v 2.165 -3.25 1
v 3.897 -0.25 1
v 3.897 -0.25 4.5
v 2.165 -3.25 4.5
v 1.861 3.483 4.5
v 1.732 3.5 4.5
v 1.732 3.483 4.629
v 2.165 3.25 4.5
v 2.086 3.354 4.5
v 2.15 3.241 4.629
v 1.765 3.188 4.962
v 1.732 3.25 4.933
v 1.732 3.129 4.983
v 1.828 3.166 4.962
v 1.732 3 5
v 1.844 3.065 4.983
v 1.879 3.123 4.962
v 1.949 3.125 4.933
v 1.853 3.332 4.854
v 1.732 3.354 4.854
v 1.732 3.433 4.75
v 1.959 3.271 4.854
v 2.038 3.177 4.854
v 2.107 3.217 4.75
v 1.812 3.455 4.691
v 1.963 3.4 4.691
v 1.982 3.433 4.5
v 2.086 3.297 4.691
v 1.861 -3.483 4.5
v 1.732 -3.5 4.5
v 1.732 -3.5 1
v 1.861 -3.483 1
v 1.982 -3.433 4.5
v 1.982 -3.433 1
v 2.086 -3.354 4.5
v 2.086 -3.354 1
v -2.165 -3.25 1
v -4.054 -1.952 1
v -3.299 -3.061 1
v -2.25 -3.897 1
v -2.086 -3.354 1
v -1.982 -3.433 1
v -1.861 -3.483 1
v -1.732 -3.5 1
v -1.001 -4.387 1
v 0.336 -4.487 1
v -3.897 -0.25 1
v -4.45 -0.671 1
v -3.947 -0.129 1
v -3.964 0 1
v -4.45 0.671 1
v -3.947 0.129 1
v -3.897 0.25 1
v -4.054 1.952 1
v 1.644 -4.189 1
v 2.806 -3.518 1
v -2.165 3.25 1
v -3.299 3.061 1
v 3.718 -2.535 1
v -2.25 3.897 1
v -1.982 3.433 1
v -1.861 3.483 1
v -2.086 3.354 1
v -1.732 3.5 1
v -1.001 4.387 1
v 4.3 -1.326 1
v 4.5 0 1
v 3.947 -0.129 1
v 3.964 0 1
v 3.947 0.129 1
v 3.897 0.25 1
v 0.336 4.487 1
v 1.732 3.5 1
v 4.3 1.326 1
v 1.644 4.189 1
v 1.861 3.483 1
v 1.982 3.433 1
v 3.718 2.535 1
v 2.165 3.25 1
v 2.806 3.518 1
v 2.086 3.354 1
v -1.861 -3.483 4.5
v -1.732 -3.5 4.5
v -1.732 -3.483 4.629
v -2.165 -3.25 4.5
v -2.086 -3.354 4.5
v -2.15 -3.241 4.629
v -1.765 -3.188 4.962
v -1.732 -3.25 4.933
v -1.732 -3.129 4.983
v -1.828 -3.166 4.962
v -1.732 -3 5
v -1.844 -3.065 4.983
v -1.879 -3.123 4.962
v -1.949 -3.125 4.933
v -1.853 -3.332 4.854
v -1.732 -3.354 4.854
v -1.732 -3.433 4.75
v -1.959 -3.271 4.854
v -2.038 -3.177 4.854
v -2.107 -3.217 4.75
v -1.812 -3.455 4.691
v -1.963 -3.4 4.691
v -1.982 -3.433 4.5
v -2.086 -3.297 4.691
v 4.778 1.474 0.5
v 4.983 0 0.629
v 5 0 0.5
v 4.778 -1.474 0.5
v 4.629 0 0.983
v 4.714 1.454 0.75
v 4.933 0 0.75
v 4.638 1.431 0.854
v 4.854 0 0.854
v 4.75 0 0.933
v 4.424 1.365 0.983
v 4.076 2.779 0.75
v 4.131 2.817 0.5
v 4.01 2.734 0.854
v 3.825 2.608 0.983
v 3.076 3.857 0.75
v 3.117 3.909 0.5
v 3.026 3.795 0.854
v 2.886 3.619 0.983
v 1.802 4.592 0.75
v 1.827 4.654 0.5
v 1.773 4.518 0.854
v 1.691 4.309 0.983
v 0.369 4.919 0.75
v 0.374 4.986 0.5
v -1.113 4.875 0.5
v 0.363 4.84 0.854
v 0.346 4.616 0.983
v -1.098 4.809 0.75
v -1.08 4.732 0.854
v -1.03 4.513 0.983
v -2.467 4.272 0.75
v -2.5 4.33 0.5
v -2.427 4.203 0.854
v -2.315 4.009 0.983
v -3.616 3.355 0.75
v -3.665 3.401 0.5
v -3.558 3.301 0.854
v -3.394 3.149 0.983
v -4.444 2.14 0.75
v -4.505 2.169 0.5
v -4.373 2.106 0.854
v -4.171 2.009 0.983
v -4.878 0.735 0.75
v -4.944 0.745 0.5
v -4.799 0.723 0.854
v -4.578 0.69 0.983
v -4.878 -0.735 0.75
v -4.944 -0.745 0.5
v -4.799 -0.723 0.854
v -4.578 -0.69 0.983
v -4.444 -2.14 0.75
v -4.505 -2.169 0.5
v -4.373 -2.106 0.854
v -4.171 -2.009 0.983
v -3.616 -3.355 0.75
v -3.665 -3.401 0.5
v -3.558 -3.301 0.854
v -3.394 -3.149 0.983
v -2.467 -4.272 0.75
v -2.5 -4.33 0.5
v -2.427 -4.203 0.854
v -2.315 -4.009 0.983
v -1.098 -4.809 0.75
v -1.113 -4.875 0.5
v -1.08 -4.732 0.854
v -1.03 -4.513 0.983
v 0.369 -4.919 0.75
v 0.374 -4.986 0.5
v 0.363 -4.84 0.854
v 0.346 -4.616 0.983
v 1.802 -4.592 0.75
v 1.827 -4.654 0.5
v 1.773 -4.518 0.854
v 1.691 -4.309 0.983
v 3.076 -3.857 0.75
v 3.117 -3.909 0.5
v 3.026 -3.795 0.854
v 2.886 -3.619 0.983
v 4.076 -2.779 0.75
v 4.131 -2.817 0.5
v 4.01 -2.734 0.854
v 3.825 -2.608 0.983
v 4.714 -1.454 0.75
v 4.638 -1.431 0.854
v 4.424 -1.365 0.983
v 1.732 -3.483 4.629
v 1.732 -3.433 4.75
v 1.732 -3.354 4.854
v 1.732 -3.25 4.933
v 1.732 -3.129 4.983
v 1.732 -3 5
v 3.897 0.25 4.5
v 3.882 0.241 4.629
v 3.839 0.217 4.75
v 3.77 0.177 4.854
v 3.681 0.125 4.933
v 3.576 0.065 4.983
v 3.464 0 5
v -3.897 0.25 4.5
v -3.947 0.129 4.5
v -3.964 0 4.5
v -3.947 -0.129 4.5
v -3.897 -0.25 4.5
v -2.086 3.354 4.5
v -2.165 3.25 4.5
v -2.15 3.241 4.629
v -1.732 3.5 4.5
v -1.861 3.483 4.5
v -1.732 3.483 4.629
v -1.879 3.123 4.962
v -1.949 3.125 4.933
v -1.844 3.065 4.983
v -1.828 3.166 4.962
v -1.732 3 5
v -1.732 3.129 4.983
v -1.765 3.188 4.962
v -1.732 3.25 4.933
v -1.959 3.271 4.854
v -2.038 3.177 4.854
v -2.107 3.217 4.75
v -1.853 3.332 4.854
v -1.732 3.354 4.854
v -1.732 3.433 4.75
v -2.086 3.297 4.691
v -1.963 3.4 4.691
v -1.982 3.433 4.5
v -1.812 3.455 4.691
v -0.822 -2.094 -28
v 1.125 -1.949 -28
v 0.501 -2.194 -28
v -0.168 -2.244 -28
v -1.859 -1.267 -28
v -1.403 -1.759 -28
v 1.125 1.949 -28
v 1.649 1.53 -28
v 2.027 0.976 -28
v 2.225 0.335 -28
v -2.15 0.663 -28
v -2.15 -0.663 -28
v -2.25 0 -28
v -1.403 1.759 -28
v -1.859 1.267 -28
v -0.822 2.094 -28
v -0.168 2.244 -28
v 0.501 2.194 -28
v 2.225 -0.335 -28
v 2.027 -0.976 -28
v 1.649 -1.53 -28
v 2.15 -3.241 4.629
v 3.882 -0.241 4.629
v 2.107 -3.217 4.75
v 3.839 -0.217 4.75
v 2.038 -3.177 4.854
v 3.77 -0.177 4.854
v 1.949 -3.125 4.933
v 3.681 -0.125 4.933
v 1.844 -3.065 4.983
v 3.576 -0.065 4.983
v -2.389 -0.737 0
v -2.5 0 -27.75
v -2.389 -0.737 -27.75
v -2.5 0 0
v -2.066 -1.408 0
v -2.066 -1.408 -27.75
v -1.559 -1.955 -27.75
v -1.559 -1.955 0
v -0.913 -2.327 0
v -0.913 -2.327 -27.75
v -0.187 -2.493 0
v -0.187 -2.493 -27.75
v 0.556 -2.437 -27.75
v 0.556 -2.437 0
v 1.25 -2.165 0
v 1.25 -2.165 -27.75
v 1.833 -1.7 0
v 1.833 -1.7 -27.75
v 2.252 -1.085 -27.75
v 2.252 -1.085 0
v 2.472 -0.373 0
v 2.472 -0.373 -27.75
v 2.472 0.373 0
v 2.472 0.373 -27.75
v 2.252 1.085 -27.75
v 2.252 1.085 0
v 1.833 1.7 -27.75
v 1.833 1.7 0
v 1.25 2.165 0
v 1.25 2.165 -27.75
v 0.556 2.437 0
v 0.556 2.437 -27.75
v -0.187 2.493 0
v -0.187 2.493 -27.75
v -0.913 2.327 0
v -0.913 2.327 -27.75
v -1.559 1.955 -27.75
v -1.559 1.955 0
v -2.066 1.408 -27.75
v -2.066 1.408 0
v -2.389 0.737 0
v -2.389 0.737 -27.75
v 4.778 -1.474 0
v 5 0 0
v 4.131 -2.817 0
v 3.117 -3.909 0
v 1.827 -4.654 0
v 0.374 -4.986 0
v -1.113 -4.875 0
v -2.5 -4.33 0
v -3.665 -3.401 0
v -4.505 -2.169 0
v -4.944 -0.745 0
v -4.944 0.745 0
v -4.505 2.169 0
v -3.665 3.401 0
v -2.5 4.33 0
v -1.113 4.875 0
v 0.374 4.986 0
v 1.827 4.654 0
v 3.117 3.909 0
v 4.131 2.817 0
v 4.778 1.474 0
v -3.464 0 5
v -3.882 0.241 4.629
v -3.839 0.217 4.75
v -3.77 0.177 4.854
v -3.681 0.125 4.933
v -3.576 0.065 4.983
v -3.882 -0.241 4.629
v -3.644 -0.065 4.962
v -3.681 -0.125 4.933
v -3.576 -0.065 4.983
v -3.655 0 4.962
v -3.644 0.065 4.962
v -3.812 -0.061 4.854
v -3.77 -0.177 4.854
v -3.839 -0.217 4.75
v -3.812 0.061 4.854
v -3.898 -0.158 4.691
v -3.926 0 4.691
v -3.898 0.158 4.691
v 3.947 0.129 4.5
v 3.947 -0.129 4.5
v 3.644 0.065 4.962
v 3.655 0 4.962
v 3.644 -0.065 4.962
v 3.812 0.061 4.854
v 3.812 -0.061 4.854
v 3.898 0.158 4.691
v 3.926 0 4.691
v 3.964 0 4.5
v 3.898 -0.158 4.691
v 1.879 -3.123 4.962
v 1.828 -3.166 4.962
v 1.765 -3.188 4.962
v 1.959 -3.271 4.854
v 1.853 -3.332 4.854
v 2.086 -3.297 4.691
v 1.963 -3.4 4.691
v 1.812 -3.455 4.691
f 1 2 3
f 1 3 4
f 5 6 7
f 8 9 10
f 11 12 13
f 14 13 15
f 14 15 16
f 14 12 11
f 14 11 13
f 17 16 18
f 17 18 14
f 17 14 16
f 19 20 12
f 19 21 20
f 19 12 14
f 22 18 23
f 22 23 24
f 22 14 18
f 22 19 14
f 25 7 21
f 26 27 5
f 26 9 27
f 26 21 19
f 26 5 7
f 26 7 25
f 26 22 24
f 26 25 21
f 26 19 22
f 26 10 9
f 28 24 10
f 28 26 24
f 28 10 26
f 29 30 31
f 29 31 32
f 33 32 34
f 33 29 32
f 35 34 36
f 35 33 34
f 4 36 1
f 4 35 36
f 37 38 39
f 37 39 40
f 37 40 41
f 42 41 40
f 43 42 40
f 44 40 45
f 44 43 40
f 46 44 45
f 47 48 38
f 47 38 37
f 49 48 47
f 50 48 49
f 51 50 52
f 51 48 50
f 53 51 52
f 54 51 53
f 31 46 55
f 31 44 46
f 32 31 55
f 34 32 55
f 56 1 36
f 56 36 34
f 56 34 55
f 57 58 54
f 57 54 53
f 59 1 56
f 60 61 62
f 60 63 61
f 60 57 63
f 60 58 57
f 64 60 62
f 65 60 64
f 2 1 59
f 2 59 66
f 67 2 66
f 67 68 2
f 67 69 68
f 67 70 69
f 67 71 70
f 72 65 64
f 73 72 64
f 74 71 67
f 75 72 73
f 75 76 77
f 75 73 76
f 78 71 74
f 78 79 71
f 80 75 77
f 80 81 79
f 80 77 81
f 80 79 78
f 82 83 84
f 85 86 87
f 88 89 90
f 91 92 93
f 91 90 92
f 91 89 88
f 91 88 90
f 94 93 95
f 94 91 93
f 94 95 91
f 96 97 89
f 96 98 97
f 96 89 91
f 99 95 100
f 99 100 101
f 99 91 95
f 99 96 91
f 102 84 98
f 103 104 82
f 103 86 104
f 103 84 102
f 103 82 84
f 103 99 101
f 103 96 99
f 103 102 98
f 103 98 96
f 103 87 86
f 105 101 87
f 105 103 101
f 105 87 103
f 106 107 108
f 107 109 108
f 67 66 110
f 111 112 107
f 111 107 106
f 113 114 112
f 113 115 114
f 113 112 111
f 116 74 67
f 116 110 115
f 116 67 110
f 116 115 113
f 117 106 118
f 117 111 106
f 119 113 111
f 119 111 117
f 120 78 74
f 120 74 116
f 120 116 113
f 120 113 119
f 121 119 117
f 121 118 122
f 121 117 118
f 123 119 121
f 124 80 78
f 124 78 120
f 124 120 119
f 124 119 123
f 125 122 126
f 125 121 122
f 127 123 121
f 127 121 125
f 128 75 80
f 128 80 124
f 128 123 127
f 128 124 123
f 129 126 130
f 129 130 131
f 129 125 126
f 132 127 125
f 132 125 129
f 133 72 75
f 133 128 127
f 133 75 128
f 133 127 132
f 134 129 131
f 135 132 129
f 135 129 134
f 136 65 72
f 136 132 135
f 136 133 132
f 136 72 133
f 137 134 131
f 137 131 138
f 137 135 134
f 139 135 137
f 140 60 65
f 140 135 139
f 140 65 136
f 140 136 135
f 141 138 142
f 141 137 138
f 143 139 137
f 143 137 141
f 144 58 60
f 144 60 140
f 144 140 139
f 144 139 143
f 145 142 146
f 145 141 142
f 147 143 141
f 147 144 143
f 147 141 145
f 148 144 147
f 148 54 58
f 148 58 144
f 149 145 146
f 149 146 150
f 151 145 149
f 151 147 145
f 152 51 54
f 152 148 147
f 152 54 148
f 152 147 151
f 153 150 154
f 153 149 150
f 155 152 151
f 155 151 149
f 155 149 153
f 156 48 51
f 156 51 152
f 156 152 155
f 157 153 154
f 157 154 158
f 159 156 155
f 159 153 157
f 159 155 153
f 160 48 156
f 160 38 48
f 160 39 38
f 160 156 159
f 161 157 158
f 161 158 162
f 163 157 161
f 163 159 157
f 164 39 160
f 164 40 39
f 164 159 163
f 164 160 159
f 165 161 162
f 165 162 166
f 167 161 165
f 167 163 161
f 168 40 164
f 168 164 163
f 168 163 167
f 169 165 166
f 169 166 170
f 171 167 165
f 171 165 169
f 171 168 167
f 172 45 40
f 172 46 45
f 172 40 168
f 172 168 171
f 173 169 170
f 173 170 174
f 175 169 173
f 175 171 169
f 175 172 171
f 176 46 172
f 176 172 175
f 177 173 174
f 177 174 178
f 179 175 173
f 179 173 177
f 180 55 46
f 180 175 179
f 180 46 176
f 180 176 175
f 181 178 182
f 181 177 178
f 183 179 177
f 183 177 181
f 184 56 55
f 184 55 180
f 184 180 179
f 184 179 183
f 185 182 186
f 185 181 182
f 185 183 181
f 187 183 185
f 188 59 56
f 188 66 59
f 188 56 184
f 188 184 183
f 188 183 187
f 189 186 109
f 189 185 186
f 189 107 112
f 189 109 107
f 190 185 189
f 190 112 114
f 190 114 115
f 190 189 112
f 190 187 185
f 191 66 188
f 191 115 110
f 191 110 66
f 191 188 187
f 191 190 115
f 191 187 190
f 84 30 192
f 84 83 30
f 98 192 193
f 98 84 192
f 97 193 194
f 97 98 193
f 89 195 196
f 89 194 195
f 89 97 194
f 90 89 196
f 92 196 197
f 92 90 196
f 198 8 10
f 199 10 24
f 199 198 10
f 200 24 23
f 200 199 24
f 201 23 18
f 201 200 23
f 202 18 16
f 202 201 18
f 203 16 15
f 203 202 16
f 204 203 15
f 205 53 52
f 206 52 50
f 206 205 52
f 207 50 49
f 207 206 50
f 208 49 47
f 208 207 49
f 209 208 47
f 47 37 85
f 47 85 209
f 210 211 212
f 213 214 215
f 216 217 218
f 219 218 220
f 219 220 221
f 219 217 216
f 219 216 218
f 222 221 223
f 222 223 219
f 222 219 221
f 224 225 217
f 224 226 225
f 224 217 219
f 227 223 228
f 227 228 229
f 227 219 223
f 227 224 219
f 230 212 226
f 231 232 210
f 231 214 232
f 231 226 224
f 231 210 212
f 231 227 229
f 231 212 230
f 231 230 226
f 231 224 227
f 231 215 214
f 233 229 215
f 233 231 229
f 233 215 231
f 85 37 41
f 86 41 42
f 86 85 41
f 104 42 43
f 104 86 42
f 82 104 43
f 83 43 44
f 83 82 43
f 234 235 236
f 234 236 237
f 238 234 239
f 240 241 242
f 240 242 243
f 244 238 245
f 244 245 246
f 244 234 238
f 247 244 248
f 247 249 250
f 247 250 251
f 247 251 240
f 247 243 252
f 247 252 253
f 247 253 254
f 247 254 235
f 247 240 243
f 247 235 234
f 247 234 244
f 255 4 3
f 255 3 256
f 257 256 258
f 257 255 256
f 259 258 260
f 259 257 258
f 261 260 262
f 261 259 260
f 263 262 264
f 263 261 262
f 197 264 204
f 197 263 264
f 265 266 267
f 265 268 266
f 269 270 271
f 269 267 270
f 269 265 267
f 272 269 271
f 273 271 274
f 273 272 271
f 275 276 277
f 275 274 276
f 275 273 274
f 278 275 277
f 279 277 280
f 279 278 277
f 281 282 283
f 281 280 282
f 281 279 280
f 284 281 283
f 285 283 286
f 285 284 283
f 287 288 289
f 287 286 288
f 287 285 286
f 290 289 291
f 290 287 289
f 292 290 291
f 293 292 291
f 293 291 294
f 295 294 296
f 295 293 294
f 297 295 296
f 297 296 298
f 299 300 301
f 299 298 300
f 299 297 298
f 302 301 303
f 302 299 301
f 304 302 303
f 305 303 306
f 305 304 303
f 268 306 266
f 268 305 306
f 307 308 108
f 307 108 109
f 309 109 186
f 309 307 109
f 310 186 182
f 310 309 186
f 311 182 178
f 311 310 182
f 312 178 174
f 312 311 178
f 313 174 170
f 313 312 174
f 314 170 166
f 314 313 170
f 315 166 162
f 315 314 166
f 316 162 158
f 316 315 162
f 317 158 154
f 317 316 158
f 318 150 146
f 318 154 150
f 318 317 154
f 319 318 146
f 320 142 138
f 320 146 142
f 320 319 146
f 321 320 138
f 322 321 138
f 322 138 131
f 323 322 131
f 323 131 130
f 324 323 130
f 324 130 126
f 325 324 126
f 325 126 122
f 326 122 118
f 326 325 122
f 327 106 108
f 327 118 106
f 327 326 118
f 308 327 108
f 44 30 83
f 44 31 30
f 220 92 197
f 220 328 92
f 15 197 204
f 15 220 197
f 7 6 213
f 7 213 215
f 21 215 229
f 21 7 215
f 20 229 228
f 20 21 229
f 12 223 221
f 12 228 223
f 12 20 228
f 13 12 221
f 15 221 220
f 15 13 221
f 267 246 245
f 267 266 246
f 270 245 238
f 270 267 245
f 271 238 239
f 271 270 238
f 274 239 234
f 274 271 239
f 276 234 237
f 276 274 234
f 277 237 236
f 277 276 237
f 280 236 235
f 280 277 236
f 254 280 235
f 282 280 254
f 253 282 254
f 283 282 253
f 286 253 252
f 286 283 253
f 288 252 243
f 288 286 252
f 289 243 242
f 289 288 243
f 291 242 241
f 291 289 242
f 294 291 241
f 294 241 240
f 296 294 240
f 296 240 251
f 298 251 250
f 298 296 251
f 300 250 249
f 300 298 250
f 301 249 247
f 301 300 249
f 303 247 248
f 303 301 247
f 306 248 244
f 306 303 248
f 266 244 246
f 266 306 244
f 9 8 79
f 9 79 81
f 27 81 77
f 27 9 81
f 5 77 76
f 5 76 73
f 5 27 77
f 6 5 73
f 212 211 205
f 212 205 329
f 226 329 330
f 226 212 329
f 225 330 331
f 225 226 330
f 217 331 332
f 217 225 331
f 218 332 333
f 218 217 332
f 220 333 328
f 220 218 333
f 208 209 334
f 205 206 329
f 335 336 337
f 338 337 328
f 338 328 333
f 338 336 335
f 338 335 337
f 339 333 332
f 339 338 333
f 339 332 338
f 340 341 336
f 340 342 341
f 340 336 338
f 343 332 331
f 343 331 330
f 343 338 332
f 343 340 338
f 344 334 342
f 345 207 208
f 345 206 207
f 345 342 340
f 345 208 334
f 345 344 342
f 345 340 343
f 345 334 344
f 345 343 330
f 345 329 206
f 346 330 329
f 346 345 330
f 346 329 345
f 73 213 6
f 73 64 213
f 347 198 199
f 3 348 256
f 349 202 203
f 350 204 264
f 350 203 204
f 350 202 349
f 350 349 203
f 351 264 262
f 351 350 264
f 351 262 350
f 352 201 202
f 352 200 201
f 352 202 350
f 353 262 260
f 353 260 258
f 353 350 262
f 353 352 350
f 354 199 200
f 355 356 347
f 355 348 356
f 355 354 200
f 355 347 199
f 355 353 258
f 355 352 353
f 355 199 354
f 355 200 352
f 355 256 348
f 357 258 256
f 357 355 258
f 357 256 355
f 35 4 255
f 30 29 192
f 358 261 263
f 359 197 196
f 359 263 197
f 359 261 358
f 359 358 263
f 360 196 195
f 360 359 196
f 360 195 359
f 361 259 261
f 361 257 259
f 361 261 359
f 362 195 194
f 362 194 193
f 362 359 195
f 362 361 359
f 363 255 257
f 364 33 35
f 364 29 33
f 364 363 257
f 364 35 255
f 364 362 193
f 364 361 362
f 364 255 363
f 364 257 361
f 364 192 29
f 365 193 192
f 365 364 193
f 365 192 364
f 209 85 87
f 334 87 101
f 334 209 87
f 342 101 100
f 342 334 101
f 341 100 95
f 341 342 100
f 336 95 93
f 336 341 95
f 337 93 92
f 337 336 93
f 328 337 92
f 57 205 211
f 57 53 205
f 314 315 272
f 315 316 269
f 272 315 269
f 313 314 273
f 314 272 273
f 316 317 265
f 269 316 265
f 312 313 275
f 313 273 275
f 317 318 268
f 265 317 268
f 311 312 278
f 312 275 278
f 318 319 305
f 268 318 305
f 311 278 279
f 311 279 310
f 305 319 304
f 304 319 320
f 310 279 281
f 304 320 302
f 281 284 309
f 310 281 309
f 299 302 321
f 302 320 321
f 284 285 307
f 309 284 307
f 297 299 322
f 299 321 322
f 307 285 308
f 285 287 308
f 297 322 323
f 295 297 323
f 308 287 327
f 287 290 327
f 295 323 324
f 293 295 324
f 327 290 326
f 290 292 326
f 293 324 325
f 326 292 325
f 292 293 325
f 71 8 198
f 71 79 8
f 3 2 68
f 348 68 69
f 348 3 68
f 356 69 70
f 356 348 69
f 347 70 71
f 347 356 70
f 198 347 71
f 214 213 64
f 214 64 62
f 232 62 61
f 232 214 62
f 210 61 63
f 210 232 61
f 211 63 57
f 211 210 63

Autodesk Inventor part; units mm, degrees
ref_plane "YZ Plane" through (0, 0, 0) normal (1, 0, 0) x (0, 1, 0)
ref_plane "XZ Plane" through (0, 0, 0) normal (0, 1, 0) x (-1, 0, 0)
ref_plane "XY Plane" through (0, 0, 0) normal (0, 0, 1) x (1, 0, 0)
sketch "草图1" plane through (0, 0, 0) normal (0, 0, 1) x (1, 0, 0)
  circle A0 centre (0, 0) radius 5
  dimension "d0" = 10
extrude "拉伸1" add sketch "草图1" along normal blind 1
sketch "草图2" plane through (0, 0, 1) normal (0, 0, 1) x (1, 0, 0)
  line L0 (2.0207, -3.5) -> (-2.0207, -3.5)
  line L1 (-2.0207, -3.5) -> (-4.0415, 0)
  line L2 (-4.0415, 0) -> (-2.0207, 3.5)
  line L3 (-2.0207, 3.5) -> (2.0207, 3.5)
  line L4 (2.0207, 3.5) -> (4.0415, 0)
  line L5 (4.0415, 0) -> (2.0207, -3.5)
  line L6 (0, 0) -> (0, 1.4053)
  circle A0 centre (0, 0) radius 5 projected
  point P0 (0, 3.5)
  dimension "d3" = 1.4053
  dimension "d4" = 3.5
extrude "拉伸2" add sketch "草图2" along normal blind 4 contours L0 L1 L2 L3 L4 L5
fillet "圆角1" radius 0.5 13 edges at (-5, 0, 1) (2.0207, 3.5, 3) (0, 3.5, 5) (-2.0207, 3.5, 3) (-3.0311, 1.75, 5) (-4.0415, 0, 3) (-3.0311, -1.75, 5) (-2.0207, -3.5, 3) (0, -3.5, 5) (2.0207, -3.5, 3) (3.0311, -1.75, 5) (4.0415, 0, 3) (3.0311, 1.75, 5)
sketch "草图3" plane through (0, 0, 0) normal (0, 0, -1) x (-1, 0, 0)
  circle A0 centre (0, 0) radius 2.5
  dimension "d8" = 5
extrude "拉伸3" add sketch "草图3" along normal blind 28
thread "螺纹1" size "M5x0.8" class "6g" standard "ANSI Metric M Profile" full length
chamfer "倒角1" distance 0.25 angle 45 1 edges at (2.5, 0, -28)
properties part number "主动轮护盖固定螺丝"
